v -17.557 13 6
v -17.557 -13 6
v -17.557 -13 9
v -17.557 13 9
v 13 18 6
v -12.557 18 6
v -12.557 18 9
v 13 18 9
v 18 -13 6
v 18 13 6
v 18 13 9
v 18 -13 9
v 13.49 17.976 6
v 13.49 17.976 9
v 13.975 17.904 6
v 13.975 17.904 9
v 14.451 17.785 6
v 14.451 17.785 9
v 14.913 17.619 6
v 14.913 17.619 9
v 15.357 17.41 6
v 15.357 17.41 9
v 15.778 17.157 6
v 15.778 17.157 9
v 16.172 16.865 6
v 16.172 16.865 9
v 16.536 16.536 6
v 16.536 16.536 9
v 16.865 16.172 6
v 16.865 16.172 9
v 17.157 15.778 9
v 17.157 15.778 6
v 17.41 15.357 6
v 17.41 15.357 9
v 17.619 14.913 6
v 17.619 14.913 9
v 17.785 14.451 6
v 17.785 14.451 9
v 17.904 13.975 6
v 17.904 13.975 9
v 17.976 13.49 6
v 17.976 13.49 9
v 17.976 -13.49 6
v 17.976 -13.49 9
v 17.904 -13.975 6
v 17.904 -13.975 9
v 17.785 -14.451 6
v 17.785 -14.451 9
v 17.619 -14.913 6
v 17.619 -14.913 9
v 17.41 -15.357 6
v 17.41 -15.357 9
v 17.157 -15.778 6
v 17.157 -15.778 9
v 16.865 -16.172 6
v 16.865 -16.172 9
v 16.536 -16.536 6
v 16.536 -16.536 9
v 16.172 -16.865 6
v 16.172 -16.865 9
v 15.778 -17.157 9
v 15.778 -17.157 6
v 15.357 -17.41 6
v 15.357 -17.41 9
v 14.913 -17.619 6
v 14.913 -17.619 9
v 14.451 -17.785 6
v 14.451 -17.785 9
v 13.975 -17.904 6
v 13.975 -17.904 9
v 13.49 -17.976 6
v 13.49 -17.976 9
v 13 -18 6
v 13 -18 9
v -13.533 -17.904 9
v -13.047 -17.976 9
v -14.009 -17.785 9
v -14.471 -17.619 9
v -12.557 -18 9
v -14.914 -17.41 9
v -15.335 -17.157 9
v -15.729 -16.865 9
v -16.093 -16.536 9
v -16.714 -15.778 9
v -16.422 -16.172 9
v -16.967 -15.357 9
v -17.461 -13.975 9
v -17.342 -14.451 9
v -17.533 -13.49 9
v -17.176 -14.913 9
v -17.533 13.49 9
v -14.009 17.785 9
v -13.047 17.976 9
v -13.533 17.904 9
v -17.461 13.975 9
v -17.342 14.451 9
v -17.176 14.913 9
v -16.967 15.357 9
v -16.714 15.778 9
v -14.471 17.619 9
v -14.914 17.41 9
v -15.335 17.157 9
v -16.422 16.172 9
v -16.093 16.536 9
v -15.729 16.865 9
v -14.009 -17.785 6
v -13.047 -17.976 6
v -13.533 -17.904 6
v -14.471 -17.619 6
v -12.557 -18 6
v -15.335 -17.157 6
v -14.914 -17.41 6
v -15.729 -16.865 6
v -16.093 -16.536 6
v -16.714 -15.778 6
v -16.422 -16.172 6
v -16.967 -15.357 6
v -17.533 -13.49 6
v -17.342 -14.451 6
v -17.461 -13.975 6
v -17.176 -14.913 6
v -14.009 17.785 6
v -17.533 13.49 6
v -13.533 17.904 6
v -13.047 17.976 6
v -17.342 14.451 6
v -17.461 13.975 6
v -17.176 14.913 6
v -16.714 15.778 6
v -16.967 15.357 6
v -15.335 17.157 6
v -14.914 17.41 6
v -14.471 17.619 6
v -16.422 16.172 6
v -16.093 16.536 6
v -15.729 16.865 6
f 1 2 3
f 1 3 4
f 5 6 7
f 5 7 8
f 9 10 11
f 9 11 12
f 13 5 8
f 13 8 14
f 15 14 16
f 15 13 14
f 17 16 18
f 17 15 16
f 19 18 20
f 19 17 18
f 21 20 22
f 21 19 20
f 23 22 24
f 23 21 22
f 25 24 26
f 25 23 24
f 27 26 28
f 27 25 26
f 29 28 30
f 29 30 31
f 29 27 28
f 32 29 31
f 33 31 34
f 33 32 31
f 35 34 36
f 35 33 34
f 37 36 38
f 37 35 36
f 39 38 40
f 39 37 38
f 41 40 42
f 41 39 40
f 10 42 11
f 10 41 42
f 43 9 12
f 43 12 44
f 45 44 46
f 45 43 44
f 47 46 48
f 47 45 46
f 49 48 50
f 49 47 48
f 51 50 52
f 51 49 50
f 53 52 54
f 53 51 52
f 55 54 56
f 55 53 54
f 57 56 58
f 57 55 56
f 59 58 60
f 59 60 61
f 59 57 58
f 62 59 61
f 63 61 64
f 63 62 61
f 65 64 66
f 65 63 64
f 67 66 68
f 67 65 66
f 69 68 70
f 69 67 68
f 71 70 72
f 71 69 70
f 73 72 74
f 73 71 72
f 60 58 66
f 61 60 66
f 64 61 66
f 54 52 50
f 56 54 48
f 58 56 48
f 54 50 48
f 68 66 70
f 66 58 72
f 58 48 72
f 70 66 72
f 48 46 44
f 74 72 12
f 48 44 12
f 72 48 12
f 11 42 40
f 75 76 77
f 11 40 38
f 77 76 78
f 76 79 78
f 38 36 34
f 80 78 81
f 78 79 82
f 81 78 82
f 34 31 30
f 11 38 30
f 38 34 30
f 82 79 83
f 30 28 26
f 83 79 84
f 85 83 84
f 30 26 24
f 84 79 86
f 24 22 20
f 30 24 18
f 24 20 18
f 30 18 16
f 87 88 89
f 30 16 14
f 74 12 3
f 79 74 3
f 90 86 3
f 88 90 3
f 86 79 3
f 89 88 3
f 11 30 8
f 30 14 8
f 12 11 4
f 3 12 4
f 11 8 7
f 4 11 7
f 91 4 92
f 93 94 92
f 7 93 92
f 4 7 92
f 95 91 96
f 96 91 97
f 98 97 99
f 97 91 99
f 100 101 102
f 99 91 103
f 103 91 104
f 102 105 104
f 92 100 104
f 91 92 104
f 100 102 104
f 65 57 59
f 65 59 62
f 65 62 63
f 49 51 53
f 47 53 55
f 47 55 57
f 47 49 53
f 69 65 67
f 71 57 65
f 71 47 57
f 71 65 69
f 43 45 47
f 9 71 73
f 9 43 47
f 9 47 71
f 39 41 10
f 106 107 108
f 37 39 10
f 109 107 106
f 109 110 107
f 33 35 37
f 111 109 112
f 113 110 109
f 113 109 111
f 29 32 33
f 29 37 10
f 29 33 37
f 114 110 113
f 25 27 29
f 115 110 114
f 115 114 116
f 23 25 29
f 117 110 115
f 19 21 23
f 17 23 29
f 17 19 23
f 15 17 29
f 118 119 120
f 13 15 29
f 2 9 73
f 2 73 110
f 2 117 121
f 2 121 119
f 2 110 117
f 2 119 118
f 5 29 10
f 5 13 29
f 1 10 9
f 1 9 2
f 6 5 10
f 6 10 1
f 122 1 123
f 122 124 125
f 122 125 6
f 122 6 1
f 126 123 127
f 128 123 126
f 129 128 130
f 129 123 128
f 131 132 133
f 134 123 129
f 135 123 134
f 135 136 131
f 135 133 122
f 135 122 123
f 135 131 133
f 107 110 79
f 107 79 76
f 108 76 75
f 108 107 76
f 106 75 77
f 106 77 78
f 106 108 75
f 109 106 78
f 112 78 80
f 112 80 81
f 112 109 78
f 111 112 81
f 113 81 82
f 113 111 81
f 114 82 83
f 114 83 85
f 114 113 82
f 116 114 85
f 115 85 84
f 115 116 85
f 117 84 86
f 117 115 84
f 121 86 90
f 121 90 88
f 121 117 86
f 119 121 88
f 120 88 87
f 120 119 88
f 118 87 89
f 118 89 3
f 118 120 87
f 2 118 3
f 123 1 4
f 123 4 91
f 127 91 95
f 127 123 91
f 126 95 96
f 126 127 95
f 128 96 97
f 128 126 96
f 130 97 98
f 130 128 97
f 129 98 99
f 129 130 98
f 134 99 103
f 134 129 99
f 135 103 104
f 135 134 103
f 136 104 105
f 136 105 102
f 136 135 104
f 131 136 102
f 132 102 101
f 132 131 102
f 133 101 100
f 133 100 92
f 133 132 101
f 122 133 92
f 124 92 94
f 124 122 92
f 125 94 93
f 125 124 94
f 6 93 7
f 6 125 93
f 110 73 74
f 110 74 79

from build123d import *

# Parameters (mm, degrees)
BOSS_EXTRUDE1_DEPTH = 3


with BuildPart() as part:
    # Sketch2 → Boss-Extrude1 (new body)
    with BuildSketch(Plane.XY.offset(6)):
        with BuildLine():
            Line((-12.557097281, 18), (13, 18))
            ThreePointArc((13, 18), (16.535533906, 16.535533906), (18, 13))
            Line((18, 13), (18, -13))
            ThreePointArc((18, -13), (16.535533906, -16.535533906), (13, -18))
            Line((13, -18), (-12.557097281, -18))
            ThreePointArc((-12.557097281, -18), (-16.092631187, -16.535533906), (-17.557097281, -13))
            Line((-17.557097281, -13), (-17.557097281, 13))
            ThreePointArc((-17.557097281, 13), (-16.092631187, 16.535533906), (-12.557097281, 18))
        make_face()
    extrude(amount=BOSS_EXTRUDE1_DEPTH)


solid = part.part
